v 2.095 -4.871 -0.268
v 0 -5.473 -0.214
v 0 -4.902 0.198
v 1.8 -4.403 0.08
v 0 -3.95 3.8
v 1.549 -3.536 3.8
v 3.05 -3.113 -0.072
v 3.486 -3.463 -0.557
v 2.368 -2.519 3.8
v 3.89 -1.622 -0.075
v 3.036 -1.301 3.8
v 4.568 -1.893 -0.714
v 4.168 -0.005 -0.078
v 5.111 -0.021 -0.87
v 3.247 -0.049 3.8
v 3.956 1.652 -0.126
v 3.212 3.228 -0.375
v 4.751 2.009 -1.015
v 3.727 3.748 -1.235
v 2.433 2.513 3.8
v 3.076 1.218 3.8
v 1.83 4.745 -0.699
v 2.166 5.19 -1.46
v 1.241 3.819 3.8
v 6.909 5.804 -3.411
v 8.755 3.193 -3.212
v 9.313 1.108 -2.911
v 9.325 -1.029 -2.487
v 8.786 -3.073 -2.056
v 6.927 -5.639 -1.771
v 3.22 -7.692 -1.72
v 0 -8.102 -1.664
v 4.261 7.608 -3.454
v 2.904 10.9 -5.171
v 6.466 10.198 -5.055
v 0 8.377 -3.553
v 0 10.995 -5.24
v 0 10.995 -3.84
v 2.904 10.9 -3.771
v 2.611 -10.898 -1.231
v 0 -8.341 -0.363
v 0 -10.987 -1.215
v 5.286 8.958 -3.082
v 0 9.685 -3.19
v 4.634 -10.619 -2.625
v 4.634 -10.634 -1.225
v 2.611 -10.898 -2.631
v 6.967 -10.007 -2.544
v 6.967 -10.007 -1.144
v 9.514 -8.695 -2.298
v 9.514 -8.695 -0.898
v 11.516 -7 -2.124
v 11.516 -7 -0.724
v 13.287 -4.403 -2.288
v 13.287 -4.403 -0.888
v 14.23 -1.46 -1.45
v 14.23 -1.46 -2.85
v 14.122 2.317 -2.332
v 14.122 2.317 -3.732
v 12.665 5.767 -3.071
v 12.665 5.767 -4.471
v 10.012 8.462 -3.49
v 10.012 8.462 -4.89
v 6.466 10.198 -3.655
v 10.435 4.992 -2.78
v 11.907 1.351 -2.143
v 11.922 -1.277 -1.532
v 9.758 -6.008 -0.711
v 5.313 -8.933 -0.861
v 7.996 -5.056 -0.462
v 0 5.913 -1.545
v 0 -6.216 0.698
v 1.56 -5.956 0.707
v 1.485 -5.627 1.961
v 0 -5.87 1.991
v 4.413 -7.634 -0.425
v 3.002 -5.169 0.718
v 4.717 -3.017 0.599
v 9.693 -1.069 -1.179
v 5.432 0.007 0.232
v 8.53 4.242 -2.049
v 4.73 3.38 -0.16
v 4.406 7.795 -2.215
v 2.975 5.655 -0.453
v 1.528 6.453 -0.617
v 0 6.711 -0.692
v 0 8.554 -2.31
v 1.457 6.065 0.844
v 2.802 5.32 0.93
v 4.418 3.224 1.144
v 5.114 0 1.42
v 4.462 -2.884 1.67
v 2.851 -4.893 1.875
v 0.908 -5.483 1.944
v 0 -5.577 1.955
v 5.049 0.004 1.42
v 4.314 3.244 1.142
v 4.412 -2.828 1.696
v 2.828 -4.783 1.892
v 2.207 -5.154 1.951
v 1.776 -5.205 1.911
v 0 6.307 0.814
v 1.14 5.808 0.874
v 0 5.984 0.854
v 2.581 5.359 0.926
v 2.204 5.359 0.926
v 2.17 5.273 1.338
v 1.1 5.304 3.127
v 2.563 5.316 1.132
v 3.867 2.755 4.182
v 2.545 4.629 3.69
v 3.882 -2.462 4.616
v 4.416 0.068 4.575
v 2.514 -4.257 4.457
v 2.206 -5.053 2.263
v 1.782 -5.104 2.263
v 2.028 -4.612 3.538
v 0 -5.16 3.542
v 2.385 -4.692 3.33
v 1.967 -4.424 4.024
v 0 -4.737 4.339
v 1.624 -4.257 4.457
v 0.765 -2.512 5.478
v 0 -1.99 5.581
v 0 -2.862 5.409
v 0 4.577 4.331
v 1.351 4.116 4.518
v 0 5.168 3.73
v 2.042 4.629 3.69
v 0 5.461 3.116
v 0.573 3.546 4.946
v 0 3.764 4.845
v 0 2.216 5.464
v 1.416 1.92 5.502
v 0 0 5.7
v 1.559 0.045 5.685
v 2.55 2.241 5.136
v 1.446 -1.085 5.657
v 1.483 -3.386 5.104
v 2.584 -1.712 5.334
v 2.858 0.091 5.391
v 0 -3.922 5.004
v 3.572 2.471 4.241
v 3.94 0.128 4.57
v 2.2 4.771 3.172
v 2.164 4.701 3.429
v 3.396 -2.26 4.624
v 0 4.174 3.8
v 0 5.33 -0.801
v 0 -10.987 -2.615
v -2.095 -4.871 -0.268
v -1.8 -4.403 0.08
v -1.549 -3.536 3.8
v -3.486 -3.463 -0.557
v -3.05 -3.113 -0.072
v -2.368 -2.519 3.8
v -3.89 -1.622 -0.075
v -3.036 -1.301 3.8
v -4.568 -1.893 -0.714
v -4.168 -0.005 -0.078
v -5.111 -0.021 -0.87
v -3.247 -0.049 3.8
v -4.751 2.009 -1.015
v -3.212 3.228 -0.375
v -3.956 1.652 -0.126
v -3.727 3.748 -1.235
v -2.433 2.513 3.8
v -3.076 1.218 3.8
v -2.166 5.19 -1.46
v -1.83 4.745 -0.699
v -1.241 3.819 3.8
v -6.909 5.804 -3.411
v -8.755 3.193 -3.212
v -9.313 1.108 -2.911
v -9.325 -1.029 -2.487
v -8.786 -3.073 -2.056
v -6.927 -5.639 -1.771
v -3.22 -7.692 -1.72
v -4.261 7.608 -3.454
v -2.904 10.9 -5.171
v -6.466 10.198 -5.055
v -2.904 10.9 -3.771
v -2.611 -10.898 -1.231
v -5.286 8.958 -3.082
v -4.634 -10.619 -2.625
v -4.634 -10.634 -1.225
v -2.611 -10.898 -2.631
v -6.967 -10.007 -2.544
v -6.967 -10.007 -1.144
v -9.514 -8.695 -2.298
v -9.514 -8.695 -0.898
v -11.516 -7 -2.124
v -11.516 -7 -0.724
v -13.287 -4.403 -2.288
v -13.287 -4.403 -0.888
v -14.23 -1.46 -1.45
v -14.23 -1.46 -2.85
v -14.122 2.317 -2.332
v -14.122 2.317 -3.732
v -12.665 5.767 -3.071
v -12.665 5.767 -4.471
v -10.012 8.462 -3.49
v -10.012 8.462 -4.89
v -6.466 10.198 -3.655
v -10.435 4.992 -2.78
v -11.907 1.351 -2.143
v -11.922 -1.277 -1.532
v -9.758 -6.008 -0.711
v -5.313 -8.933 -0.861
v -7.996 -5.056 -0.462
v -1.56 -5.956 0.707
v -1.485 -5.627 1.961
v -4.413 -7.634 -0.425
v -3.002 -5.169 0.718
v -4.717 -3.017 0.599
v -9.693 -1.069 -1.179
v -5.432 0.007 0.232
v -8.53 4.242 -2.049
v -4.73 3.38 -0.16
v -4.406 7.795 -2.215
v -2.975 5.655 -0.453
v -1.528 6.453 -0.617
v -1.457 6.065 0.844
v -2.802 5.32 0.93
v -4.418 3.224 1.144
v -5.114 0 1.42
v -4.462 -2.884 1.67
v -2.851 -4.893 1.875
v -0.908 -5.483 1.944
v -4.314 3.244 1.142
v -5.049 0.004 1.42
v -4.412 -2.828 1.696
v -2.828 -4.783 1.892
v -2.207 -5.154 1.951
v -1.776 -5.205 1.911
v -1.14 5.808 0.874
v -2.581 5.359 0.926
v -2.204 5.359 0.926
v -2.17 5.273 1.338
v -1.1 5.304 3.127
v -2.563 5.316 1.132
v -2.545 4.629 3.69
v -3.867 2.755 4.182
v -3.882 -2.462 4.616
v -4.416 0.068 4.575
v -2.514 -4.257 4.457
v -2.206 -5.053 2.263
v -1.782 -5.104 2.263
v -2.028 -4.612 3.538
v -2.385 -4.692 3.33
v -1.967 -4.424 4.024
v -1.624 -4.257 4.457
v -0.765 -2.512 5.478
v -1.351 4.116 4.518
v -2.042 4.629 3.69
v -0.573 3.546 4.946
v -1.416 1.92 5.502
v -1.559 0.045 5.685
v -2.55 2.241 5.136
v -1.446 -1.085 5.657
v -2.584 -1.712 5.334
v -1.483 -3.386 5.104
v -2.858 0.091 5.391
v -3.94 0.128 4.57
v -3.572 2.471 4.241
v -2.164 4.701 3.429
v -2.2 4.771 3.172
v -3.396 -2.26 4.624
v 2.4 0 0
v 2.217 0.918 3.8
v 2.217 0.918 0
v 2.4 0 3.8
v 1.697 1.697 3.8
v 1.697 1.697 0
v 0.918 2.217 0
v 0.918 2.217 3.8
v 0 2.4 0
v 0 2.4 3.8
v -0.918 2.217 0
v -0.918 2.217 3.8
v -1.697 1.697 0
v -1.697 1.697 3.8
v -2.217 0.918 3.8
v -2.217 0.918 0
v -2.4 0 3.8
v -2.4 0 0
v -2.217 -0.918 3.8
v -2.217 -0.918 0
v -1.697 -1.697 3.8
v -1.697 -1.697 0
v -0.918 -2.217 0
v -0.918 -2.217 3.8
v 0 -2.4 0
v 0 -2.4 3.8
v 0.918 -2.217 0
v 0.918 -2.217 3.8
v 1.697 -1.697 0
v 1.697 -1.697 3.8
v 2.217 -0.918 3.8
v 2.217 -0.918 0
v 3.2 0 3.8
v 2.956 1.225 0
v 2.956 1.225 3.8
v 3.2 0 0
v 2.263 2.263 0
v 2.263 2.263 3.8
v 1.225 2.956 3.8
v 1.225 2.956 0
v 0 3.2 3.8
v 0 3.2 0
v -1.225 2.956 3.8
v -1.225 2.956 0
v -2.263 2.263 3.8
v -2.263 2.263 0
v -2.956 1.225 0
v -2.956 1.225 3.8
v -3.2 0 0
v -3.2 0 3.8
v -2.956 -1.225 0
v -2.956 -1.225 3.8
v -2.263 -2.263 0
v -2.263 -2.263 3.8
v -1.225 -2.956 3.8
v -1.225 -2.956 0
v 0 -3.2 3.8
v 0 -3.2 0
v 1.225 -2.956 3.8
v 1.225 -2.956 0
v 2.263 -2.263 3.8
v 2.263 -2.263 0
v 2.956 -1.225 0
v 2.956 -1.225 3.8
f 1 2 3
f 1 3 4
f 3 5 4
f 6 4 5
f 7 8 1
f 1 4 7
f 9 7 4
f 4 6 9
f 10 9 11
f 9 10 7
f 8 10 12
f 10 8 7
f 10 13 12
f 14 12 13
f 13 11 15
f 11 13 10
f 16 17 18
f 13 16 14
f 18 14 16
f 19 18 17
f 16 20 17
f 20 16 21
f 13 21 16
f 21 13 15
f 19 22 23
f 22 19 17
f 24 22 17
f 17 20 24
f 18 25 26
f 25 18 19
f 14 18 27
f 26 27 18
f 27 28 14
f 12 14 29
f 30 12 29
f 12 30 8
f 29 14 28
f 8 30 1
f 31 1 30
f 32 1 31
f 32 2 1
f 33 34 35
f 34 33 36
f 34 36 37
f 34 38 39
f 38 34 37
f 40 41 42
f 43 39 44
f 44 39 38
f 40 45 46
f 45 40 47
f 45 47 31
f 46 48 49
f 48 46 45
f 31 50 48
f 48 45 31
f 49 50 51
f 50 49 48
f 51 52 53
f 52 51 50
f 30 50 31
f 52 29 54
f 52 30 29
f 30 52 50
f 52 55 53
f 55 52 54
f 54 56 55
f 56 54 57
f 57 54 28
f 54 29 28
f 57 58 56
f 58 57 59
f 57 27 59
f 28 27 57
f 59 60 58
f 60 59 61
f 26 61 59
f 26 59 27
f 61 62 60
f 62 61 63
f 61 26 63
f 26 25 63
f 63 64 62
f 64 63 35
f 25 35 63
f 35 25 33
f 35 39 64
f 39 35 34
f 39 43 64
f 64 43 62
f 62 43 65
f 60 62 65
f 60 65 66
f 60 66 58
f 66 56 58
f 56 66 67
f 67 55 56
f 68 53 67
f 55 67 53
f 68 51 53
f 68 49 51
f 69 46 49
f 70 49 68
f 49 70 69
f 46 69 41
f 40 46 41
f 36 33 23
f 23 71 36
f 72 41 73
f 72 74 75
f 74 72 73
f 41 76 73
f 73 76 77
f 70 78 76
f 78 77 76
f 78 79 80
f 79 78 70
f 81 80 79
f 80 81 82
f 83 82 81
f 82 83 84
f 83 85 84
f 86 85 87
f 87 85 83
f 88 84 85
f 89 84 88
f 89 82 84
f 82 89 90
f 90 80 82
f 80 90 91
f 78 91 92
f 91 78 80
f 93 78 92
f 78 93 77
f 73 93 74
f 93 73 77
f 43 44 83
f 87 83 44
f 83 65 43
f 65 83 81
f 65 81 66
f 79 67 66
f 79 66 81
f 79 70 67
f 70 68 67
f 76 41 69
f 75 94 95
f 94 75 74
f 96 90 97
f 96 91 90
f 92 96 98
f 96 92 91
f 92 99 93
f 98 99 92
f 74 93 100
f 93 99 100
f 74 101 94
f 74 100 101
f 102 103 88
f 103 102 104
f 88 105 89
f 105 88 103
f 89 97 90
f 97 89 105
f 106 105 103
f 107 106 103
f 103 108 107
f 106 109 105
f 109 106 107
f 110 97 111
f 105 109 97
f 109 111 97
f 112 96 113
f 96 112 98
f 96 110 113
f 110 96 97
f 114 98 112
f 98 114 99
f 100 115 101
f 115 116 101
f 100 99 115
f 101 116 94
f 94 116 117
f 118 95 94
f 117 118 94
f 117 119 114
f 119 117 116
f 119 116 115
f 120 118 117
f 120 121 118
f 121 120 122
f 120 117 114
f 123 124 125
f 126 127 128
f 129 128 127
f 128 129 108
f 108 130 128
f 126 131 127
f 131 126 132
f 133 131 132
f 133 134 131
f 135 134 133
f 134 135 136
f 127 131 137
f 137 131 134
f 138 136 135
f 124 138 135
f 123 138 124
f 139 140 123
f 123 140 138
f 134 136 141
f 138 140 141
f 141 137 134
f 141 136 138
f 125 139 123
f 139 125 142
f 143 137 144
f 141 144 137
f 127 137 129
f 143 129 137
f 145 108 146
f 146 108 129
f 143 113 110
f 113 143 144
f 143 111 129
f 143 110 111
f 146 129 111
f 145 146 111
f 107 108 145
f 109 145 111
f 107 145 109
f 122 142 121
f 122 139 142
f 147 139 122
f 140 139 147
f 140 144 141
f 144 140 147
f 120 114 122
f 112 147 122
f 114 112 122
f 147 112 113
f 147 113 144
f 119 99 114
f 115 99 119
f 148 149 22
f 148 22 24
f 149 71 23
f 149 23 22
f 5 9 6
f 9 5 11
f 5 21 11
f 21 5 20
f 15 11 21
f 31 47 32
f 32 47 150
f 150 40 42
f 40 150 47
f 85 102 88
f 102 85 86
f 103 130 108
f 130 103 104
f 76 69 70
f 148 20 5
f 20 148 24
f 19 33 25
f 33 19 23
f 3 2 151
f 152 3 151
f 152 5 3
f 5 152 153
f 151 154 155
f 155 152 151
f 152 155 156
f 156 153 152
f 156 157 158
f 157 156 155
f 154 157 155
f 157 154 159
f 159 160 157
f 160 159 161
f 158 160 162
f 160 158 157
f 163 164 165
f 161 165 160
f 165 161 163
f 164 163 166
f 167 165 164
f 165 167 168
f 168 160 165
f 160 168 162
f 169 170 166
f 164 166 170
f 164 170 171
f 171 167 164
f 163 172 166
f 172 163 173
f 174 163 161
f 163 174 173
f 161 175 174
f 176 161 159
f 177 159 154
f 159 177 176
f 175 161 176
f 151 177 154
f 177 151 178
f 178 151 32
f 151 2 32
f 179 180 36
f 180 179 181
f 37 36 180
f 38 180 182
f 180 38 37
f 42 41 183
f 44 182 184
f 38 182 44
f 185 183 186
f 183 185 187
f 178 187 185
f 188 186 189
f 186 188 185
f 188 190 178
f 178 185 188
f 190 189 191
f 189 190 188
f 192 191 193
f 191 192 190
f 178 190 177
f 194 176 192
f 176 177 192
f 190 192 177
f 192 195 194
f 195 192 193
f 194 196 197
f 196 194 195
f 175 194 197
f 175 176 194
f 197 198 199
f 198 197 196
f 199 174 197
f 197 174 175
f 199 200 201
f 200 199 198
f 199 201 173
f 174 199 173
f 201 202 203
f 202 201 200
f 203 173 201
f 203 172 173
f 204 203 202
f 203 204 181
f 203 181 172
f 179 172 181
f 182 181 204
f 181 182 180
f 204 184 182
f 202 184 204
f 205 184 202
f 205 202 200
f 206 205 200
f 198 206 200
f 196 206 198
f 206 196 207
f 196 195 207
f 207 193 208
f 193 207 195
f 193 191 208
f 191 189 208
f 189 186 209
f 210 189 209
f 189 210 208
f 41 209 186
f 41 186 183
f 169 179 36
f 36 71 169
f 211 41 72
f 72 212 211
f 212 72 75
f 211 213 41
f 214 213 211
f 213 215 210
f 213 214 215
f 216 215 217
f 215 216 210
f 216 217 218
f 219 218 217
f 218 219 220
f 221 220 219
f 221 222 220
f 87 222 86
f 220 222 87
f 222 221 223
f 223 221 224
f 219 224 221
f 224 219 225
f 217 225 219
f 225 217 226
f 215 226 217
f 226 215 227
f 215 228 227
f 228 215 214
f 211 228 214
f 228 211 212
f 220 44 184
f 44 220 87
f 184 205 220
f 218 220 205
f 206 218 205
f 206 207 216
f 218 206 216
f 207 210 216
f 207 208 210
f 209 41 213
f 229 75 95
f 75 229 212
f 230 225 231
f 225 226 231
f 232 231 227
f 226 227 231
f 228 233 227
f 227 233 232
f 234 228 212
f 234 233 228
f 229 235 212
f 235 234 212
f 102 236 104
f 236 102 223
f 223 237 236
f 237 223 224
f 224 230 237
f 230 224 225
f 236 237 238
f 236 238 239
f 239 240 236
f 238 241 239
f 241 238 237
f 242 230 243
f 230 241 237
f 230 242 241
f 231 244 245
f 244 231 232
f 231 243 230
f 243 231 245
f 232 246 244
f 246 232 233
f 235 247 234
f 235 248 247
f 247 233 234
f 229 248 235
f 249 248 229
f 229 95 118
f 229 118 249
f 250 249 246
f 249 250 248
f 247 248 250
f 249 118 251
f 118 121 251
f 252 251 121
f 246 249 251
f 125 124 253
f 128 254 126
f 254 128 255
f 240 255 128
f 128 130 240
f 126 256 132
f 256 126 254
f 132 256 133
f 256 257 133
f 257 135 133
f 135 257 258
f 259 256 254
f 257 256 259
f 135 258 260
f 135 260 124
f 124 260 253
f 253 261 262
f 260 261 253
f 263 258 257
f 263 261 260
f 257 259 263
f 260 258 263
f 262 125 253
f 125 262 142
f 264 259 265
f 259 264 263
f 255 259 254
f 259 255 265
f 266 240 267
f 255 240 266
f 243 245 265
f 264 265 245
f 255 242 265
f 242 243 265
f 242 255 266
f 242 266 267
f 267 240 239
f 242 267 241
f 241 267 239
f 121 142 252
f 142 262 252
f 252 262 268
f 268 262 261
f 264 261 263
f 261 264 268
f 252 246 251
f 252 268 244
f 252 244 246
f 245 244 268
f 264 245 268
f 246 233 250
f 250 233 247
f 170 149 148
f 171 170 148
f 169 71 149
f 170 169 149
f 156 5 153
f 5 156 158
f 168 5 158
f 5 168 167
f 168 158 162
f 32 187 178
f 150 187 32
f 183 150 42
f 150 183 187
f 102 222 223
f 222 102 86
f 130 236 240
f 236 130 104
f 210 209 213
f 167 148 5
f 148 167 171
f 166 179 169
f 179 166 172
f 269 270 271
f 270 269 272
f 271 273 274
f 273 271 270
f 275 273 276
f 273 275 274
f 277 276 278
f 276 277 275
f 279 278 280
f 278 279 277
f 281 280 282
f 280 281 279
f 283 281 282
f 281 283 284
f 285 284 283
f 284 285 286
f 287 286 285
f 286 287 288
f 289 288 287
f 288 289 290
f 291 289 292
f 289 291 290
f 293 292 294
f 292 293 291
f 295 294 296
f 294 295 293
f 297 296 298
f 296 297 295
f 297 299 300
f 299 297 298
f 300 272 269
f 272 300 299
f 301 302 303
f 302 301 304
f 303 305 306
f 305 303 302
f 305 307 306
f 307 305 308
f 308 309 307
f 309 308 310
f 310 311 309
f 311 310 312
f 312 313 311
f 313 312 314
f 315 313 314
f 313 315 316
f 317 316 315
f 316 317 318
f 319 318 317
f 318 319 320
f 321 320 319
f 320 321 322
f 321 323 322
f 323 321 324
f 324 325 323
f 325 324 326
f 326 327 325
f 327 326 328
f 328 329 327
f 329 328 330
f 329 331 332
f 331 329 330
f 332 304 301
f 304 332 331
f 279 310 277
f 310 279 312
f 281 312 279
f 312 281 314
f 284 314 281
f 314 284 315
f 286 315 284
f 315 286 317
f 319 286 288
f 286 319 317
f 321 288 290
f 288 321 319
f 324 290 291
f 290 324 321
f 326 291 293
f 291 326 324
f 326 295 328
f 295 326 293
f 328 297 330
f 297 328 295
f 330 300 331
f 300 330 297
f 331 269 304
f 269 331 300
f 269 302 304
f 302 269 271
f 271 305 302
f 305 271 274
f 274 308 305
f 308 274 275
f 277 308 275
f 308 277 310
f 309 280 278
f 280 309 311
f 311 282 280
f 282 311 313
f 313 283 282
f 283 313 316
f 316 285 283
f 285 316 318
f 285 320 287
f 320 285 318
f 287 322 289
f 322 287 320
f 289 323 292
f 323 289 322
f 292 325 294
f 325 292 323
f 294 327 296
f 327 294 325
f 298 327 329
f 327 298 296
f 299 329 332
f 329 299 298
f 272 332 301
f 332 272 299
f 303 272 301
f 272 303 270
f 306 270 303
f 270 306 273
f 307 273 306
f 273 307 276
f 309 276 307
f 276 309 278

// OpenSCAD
use <../lib.scad>
use <s/90538s01.scad>
use <../p/stud4.scad>
function ldraw_lib__90538() = [
// 0 Minifig Hat Fedora with Wide Brim
// 0 Name: 90538.dat
// 0 Author: Magnus Forsberg [MagFors]
// 0 !LDRAW_ORG Part UPDATE 2024-08
// 0 !LICENSE Licensed under CC BY 4.0 : see CAreadme.txt
// 
// 0 BFC CERTIFY CCW
  [0,"BFC","CERTIFY"],
  [0,"BFC","CCW"],
// 
// 0 !CATEGORY Minifig Headwear
// 0 !KEYWORDS Cad Bane, set 8098, set 8128, Star Wars, SW
// 
// 0 !HISTORY 2013-08-14 {LEGO Digital Designer} Original part shape
// 0 !HISTORY 2024-03-30 [MagFors] File preparation for LDraw Parts Tracker
// 0 !HISTORY 2024-09-30 [OrionP] Official Update 2024-08
// 
// 1 16 0 0 0 1 0 0 0 1 0 0 0 1 s\90538s01.dat
  [1,16,0,0,0,1,0,0,0,1,0,0,0,1, ldraw_lib__s__90538s01()],
// 1 16 0 0 0 -1 0 0 0 1 0 0 0 1 s\90538s01.dat
  [1,16,0,0,0,-1,0,0,0,1,0,0,0,1, ldraw_lib__s__90538s01()],
// 
// 1 16 0 -9.5 0 1 0 0 0 -2.375 0 0 0 1 stud4.dat
  [1,16,0,-9.5,0,1,0,0,0,-2.375,0,0,0,1, ldraw_lib__stud4()],
// 5 24 0 -13.523 -7.154 0 -12.511 -9.806 -3.707 -12.761 -8.464 3.707 -12.761 -8.464
  [5,24,0,-13.523,-7.154,0,-12.511,-9.806,-3.707,-12.761,-8.464,3.707,-12.761,-8.464],
// 5 24 0 -12.511 -9.806 0 -10.848 -11.843 4.06 -11.143 -10.643 -4.06 -11.143 -10.643
  [5,24,0,-12.511,-9.806,0,-10.848,-11.843,4.06,-11.143,-10.643,-4.06,-11.143,-10.643],
// 5 24 0 2.003 13.326 0 3.862 14.782 -5.414 3.65 12.975 5.414 3.65 12.975
  [5,24,0,2.003,13.326,0,3.862,14.782,-5.414,3.65,12.975,5.414,3.65,12.975],
// 5 24 0 -10.848 -11.843 0 -8.854 -12.899 -4.918 -10.061 -11.061 4.918 -10.061 -11.061
  [5,24,0,-10.848,-11.843,0,-8.854,-12.899,-4.918,-10.061,-11.061,4.918,-10.061,-11.061],
// 5 24 0 -10.828 11.443 0 -12.113 9.411 1.433 -12.366 8.864 -1.433 -12.366 8.864
  [5,24,0,-10.828,11.443,0,-12.113,9.411,1.433,-12.366,8.864,-1.433,-12.366,8.864],
// 5 24 0 1.73 16.777 0 -2.035 15.768 -3.82 1.542 16.133 3.82 1.542 16.133
  [5,24,0,1.73,16.777,0,-2.035,15.768,-3.82,1.542,16.133,3.82,1.542,16.133],
// 5 24 0 0.534 -13.682 0 -0.495 -12.256 -5.2382 0.671 -12.1773 5.2382 0.671 -12.1773
  [5,24,0,0.534,-13.682,0,-0.495,-12.256,-5.2382,0.671,-12.1773,5.2382,0.671,-12.1773],
// 5 24 0 -9.5 10.435 0 2.003 13.326 -4.576 1.747 11.862 4.576 1.747 11.862
  [5,24,0,-9.5,10.435,0,2.003,13.326,-4.576,1.747,11.862,4.576,1.747,11.862],
// 5 24 0 4.159 -20.255 0 0.534 -13.682 5.2382 0.671 -12.1773 -5.2382 0.671 -12.1773
  [5,24,0,4.159,-20.255,0,0.534,-13.682,5.2382,0.671,-12.1773,-5.2382,0.671,-12.1773],
// 5 24 0 -0.495 -12.256 0 -9.5 -9.875 4.4998 -0.199 -11.0069 -4.4998 -0.199 -11.0069
  [5,24,0,-0.495,-12.256,0,-9.5,-9.875,4.4998,-0.199,-11.0069,-4.4998,-0.199,-11.0069],
// 5 24 0 -14.25 0 0 -13.953 -4.976 3.615 -14.142 -2.712 -3.615 -14.142 -2.712
  [5,24,0,-14.25,0,0,-13.953,-4.976,3.615,-14.142,-2.712,-3.615,-14.142,-2.712],
// 5 24 0 -7.789 13.653 0 -9.326 12.919 2.749 -7.818 13.261 -2.749 -7.818 13.261
  [5,24,0,-7.789,13.653,0,-9.326,12.919,2.749,-7.818,13.261,-2.749,-7.818,13.261],
// 5 24 0 -8.854 -12.899 0 -4.888 -13.943 -2.271 -4.859 -13.708 2.271 -4.859 -13.708
  [5,24,0,-8.854,-12.899,0,-4.888,-13.943,-2.271,-4.859,-13.708,2.271,-4.859,-13.708],
// 5 24 0 -4.978 -14.674 0 -1.746 -15.54 3.901 -1.768 -14.891 -3.901 -1.768 -14.891
  [5,24,0,-4.978,-14.674,0,-1.746,-15.54,3.901,-1.768,-14.891,-3.901,-1.768,-14.891],
// 5 24 0 7.976 24.212 0 5.775 21.385 11.014 5.538 19.487 -11.014 5.538 19.487
  [5,24,0,7.976,24.212,0,5.775,21.385,11.014,5.538,19.487,-11.014,5.538,19.487],
// 5 24 0 -13.661 5.54 0 -14.25 0 3.54 -13.756 4.801 -3.54 -13.756 4.801
  [5,24,0,-13.661,5.54,0,-14.25,0,3.54,-13.756,4.801,-3.54,-13.756,4.801],
// 5 24 0 5.775 21.385 0 1.73 16.777 -3.82 1.542 16.133 3.82 1.542 16.133
  [5,24,0,5.775,21.385,0,1.73,16.777,-3.82,1.542,16.133,3.82,1.542,16.133],
// 5 24 0 -9.326 12.919 0 -10.828 11.443 3.377 -11.296 10.291 -3.377 -11.296 10.291
  [5,24,0,-9.326,12.919,0,-10.828,11.443,3.377,-11.296,10.291,-3.377,-11.296,10.291],
// 5 24 0 13.099 27.487 0 9.599 27.487 7.261 12.928 27.249 -7.261 12.928 27.249
  [5,24,0,13.099,27.487,0,9.599,27.487,7.261,12.928,27.249,-7.261,12.928,27.249],
// 5 24 0 6.537 -27.467 0 4.159 -20.255 -6.527 6.578 -27.244 6.527 6.578 -27.244
  [5,24,0,6.537,-27.467,0,4.159,-20.255,-6.527,6.578,-27.244,6.527,6.578,-27.244],
// 5 24 0 -1.746 -15.54 0 0.907 -20.852 3.901 -1.768 -14.891 -3.901 -1.768 -14.891
  [5,24,0,-1.746,-15.54,0,0.907,-20.852,3.901,-1.768,-14.891,-3.901,-1.768,-14.891],
// 5 24 0 9.599 27.487 0 7.976 24.212 7.261 9.428 27.249 -7.261 9.428 27.249
  [5,24,0,9.599,27.487,0,7.976,24.212,7.261,9.428,27.249,-7.261,9.428,27.249],
// 5 24 0 8.883 20.942 0 13.099 27.487 7.261 12.928 27.249 -7.261 12.928 27.249
  [5,24,0,8.883,20.942,0,13.099,27.487,7.261,12.928,27.249,-7.261,12.928,27.249],
// 5 24 0 -12.113 9.411 0 -13.661 5.54 -1.433 -12.366 8.864 1.433 -12.366 8.864
  [5,24,0,-12.113,9.411,0,-13.661,5.54,-1.433,-12.366,8.864,1.433,-12.366,8.864],
// 5 24 0 -2.134 14.96 0 -7.789 13.653 -2.851 -2.186 14.519 2.851 -2.186 14.519
  [5,24,0,-2.134,14.96,0,-7.789,13.653,-2.851,-2.186,14.519,2.851,-2.186,14.519],
// 5 24 0 3.037 -27.467 0 6.537 -27.467 -6.527 3.078 -27.244 6.527 3.078 -27.244
  [5,24,0,3.037,-27.467,0,6.537,-27.467,-6.527,3.078,-27.244,6.527,3.078,-27.244],
// 5 24 0 3.862 14.782 0 8.883 20.942 5.414 3.65 12.975 -5.414 3.65 12.975
  [5,24,0,3.862,14.782,0,8.883,20.942,5.414,3.65,12.975,-5.414,3.65,12.975],
// 5 24 0 0.907 -20.852 0 3.037 -27.467 -6.527 3.078 -27.244 6.527 3.078 -27.244
  [5,24,0,0.907,-20.852,0,3.037,-27.467,-6.527,3.078,-27.244,6.527,3.078,-27.244],
];
module ldraw_lib__90538(step=0, col=false, unit=2/5, alt=false, line=0.2, solid=!$preview)
    makepoly(ldraw_lib__90538(), step=step, col=col, unit=unit, alt=alt, line=line, solid=solid);
ldraw_lib__90538(line=0.2);
